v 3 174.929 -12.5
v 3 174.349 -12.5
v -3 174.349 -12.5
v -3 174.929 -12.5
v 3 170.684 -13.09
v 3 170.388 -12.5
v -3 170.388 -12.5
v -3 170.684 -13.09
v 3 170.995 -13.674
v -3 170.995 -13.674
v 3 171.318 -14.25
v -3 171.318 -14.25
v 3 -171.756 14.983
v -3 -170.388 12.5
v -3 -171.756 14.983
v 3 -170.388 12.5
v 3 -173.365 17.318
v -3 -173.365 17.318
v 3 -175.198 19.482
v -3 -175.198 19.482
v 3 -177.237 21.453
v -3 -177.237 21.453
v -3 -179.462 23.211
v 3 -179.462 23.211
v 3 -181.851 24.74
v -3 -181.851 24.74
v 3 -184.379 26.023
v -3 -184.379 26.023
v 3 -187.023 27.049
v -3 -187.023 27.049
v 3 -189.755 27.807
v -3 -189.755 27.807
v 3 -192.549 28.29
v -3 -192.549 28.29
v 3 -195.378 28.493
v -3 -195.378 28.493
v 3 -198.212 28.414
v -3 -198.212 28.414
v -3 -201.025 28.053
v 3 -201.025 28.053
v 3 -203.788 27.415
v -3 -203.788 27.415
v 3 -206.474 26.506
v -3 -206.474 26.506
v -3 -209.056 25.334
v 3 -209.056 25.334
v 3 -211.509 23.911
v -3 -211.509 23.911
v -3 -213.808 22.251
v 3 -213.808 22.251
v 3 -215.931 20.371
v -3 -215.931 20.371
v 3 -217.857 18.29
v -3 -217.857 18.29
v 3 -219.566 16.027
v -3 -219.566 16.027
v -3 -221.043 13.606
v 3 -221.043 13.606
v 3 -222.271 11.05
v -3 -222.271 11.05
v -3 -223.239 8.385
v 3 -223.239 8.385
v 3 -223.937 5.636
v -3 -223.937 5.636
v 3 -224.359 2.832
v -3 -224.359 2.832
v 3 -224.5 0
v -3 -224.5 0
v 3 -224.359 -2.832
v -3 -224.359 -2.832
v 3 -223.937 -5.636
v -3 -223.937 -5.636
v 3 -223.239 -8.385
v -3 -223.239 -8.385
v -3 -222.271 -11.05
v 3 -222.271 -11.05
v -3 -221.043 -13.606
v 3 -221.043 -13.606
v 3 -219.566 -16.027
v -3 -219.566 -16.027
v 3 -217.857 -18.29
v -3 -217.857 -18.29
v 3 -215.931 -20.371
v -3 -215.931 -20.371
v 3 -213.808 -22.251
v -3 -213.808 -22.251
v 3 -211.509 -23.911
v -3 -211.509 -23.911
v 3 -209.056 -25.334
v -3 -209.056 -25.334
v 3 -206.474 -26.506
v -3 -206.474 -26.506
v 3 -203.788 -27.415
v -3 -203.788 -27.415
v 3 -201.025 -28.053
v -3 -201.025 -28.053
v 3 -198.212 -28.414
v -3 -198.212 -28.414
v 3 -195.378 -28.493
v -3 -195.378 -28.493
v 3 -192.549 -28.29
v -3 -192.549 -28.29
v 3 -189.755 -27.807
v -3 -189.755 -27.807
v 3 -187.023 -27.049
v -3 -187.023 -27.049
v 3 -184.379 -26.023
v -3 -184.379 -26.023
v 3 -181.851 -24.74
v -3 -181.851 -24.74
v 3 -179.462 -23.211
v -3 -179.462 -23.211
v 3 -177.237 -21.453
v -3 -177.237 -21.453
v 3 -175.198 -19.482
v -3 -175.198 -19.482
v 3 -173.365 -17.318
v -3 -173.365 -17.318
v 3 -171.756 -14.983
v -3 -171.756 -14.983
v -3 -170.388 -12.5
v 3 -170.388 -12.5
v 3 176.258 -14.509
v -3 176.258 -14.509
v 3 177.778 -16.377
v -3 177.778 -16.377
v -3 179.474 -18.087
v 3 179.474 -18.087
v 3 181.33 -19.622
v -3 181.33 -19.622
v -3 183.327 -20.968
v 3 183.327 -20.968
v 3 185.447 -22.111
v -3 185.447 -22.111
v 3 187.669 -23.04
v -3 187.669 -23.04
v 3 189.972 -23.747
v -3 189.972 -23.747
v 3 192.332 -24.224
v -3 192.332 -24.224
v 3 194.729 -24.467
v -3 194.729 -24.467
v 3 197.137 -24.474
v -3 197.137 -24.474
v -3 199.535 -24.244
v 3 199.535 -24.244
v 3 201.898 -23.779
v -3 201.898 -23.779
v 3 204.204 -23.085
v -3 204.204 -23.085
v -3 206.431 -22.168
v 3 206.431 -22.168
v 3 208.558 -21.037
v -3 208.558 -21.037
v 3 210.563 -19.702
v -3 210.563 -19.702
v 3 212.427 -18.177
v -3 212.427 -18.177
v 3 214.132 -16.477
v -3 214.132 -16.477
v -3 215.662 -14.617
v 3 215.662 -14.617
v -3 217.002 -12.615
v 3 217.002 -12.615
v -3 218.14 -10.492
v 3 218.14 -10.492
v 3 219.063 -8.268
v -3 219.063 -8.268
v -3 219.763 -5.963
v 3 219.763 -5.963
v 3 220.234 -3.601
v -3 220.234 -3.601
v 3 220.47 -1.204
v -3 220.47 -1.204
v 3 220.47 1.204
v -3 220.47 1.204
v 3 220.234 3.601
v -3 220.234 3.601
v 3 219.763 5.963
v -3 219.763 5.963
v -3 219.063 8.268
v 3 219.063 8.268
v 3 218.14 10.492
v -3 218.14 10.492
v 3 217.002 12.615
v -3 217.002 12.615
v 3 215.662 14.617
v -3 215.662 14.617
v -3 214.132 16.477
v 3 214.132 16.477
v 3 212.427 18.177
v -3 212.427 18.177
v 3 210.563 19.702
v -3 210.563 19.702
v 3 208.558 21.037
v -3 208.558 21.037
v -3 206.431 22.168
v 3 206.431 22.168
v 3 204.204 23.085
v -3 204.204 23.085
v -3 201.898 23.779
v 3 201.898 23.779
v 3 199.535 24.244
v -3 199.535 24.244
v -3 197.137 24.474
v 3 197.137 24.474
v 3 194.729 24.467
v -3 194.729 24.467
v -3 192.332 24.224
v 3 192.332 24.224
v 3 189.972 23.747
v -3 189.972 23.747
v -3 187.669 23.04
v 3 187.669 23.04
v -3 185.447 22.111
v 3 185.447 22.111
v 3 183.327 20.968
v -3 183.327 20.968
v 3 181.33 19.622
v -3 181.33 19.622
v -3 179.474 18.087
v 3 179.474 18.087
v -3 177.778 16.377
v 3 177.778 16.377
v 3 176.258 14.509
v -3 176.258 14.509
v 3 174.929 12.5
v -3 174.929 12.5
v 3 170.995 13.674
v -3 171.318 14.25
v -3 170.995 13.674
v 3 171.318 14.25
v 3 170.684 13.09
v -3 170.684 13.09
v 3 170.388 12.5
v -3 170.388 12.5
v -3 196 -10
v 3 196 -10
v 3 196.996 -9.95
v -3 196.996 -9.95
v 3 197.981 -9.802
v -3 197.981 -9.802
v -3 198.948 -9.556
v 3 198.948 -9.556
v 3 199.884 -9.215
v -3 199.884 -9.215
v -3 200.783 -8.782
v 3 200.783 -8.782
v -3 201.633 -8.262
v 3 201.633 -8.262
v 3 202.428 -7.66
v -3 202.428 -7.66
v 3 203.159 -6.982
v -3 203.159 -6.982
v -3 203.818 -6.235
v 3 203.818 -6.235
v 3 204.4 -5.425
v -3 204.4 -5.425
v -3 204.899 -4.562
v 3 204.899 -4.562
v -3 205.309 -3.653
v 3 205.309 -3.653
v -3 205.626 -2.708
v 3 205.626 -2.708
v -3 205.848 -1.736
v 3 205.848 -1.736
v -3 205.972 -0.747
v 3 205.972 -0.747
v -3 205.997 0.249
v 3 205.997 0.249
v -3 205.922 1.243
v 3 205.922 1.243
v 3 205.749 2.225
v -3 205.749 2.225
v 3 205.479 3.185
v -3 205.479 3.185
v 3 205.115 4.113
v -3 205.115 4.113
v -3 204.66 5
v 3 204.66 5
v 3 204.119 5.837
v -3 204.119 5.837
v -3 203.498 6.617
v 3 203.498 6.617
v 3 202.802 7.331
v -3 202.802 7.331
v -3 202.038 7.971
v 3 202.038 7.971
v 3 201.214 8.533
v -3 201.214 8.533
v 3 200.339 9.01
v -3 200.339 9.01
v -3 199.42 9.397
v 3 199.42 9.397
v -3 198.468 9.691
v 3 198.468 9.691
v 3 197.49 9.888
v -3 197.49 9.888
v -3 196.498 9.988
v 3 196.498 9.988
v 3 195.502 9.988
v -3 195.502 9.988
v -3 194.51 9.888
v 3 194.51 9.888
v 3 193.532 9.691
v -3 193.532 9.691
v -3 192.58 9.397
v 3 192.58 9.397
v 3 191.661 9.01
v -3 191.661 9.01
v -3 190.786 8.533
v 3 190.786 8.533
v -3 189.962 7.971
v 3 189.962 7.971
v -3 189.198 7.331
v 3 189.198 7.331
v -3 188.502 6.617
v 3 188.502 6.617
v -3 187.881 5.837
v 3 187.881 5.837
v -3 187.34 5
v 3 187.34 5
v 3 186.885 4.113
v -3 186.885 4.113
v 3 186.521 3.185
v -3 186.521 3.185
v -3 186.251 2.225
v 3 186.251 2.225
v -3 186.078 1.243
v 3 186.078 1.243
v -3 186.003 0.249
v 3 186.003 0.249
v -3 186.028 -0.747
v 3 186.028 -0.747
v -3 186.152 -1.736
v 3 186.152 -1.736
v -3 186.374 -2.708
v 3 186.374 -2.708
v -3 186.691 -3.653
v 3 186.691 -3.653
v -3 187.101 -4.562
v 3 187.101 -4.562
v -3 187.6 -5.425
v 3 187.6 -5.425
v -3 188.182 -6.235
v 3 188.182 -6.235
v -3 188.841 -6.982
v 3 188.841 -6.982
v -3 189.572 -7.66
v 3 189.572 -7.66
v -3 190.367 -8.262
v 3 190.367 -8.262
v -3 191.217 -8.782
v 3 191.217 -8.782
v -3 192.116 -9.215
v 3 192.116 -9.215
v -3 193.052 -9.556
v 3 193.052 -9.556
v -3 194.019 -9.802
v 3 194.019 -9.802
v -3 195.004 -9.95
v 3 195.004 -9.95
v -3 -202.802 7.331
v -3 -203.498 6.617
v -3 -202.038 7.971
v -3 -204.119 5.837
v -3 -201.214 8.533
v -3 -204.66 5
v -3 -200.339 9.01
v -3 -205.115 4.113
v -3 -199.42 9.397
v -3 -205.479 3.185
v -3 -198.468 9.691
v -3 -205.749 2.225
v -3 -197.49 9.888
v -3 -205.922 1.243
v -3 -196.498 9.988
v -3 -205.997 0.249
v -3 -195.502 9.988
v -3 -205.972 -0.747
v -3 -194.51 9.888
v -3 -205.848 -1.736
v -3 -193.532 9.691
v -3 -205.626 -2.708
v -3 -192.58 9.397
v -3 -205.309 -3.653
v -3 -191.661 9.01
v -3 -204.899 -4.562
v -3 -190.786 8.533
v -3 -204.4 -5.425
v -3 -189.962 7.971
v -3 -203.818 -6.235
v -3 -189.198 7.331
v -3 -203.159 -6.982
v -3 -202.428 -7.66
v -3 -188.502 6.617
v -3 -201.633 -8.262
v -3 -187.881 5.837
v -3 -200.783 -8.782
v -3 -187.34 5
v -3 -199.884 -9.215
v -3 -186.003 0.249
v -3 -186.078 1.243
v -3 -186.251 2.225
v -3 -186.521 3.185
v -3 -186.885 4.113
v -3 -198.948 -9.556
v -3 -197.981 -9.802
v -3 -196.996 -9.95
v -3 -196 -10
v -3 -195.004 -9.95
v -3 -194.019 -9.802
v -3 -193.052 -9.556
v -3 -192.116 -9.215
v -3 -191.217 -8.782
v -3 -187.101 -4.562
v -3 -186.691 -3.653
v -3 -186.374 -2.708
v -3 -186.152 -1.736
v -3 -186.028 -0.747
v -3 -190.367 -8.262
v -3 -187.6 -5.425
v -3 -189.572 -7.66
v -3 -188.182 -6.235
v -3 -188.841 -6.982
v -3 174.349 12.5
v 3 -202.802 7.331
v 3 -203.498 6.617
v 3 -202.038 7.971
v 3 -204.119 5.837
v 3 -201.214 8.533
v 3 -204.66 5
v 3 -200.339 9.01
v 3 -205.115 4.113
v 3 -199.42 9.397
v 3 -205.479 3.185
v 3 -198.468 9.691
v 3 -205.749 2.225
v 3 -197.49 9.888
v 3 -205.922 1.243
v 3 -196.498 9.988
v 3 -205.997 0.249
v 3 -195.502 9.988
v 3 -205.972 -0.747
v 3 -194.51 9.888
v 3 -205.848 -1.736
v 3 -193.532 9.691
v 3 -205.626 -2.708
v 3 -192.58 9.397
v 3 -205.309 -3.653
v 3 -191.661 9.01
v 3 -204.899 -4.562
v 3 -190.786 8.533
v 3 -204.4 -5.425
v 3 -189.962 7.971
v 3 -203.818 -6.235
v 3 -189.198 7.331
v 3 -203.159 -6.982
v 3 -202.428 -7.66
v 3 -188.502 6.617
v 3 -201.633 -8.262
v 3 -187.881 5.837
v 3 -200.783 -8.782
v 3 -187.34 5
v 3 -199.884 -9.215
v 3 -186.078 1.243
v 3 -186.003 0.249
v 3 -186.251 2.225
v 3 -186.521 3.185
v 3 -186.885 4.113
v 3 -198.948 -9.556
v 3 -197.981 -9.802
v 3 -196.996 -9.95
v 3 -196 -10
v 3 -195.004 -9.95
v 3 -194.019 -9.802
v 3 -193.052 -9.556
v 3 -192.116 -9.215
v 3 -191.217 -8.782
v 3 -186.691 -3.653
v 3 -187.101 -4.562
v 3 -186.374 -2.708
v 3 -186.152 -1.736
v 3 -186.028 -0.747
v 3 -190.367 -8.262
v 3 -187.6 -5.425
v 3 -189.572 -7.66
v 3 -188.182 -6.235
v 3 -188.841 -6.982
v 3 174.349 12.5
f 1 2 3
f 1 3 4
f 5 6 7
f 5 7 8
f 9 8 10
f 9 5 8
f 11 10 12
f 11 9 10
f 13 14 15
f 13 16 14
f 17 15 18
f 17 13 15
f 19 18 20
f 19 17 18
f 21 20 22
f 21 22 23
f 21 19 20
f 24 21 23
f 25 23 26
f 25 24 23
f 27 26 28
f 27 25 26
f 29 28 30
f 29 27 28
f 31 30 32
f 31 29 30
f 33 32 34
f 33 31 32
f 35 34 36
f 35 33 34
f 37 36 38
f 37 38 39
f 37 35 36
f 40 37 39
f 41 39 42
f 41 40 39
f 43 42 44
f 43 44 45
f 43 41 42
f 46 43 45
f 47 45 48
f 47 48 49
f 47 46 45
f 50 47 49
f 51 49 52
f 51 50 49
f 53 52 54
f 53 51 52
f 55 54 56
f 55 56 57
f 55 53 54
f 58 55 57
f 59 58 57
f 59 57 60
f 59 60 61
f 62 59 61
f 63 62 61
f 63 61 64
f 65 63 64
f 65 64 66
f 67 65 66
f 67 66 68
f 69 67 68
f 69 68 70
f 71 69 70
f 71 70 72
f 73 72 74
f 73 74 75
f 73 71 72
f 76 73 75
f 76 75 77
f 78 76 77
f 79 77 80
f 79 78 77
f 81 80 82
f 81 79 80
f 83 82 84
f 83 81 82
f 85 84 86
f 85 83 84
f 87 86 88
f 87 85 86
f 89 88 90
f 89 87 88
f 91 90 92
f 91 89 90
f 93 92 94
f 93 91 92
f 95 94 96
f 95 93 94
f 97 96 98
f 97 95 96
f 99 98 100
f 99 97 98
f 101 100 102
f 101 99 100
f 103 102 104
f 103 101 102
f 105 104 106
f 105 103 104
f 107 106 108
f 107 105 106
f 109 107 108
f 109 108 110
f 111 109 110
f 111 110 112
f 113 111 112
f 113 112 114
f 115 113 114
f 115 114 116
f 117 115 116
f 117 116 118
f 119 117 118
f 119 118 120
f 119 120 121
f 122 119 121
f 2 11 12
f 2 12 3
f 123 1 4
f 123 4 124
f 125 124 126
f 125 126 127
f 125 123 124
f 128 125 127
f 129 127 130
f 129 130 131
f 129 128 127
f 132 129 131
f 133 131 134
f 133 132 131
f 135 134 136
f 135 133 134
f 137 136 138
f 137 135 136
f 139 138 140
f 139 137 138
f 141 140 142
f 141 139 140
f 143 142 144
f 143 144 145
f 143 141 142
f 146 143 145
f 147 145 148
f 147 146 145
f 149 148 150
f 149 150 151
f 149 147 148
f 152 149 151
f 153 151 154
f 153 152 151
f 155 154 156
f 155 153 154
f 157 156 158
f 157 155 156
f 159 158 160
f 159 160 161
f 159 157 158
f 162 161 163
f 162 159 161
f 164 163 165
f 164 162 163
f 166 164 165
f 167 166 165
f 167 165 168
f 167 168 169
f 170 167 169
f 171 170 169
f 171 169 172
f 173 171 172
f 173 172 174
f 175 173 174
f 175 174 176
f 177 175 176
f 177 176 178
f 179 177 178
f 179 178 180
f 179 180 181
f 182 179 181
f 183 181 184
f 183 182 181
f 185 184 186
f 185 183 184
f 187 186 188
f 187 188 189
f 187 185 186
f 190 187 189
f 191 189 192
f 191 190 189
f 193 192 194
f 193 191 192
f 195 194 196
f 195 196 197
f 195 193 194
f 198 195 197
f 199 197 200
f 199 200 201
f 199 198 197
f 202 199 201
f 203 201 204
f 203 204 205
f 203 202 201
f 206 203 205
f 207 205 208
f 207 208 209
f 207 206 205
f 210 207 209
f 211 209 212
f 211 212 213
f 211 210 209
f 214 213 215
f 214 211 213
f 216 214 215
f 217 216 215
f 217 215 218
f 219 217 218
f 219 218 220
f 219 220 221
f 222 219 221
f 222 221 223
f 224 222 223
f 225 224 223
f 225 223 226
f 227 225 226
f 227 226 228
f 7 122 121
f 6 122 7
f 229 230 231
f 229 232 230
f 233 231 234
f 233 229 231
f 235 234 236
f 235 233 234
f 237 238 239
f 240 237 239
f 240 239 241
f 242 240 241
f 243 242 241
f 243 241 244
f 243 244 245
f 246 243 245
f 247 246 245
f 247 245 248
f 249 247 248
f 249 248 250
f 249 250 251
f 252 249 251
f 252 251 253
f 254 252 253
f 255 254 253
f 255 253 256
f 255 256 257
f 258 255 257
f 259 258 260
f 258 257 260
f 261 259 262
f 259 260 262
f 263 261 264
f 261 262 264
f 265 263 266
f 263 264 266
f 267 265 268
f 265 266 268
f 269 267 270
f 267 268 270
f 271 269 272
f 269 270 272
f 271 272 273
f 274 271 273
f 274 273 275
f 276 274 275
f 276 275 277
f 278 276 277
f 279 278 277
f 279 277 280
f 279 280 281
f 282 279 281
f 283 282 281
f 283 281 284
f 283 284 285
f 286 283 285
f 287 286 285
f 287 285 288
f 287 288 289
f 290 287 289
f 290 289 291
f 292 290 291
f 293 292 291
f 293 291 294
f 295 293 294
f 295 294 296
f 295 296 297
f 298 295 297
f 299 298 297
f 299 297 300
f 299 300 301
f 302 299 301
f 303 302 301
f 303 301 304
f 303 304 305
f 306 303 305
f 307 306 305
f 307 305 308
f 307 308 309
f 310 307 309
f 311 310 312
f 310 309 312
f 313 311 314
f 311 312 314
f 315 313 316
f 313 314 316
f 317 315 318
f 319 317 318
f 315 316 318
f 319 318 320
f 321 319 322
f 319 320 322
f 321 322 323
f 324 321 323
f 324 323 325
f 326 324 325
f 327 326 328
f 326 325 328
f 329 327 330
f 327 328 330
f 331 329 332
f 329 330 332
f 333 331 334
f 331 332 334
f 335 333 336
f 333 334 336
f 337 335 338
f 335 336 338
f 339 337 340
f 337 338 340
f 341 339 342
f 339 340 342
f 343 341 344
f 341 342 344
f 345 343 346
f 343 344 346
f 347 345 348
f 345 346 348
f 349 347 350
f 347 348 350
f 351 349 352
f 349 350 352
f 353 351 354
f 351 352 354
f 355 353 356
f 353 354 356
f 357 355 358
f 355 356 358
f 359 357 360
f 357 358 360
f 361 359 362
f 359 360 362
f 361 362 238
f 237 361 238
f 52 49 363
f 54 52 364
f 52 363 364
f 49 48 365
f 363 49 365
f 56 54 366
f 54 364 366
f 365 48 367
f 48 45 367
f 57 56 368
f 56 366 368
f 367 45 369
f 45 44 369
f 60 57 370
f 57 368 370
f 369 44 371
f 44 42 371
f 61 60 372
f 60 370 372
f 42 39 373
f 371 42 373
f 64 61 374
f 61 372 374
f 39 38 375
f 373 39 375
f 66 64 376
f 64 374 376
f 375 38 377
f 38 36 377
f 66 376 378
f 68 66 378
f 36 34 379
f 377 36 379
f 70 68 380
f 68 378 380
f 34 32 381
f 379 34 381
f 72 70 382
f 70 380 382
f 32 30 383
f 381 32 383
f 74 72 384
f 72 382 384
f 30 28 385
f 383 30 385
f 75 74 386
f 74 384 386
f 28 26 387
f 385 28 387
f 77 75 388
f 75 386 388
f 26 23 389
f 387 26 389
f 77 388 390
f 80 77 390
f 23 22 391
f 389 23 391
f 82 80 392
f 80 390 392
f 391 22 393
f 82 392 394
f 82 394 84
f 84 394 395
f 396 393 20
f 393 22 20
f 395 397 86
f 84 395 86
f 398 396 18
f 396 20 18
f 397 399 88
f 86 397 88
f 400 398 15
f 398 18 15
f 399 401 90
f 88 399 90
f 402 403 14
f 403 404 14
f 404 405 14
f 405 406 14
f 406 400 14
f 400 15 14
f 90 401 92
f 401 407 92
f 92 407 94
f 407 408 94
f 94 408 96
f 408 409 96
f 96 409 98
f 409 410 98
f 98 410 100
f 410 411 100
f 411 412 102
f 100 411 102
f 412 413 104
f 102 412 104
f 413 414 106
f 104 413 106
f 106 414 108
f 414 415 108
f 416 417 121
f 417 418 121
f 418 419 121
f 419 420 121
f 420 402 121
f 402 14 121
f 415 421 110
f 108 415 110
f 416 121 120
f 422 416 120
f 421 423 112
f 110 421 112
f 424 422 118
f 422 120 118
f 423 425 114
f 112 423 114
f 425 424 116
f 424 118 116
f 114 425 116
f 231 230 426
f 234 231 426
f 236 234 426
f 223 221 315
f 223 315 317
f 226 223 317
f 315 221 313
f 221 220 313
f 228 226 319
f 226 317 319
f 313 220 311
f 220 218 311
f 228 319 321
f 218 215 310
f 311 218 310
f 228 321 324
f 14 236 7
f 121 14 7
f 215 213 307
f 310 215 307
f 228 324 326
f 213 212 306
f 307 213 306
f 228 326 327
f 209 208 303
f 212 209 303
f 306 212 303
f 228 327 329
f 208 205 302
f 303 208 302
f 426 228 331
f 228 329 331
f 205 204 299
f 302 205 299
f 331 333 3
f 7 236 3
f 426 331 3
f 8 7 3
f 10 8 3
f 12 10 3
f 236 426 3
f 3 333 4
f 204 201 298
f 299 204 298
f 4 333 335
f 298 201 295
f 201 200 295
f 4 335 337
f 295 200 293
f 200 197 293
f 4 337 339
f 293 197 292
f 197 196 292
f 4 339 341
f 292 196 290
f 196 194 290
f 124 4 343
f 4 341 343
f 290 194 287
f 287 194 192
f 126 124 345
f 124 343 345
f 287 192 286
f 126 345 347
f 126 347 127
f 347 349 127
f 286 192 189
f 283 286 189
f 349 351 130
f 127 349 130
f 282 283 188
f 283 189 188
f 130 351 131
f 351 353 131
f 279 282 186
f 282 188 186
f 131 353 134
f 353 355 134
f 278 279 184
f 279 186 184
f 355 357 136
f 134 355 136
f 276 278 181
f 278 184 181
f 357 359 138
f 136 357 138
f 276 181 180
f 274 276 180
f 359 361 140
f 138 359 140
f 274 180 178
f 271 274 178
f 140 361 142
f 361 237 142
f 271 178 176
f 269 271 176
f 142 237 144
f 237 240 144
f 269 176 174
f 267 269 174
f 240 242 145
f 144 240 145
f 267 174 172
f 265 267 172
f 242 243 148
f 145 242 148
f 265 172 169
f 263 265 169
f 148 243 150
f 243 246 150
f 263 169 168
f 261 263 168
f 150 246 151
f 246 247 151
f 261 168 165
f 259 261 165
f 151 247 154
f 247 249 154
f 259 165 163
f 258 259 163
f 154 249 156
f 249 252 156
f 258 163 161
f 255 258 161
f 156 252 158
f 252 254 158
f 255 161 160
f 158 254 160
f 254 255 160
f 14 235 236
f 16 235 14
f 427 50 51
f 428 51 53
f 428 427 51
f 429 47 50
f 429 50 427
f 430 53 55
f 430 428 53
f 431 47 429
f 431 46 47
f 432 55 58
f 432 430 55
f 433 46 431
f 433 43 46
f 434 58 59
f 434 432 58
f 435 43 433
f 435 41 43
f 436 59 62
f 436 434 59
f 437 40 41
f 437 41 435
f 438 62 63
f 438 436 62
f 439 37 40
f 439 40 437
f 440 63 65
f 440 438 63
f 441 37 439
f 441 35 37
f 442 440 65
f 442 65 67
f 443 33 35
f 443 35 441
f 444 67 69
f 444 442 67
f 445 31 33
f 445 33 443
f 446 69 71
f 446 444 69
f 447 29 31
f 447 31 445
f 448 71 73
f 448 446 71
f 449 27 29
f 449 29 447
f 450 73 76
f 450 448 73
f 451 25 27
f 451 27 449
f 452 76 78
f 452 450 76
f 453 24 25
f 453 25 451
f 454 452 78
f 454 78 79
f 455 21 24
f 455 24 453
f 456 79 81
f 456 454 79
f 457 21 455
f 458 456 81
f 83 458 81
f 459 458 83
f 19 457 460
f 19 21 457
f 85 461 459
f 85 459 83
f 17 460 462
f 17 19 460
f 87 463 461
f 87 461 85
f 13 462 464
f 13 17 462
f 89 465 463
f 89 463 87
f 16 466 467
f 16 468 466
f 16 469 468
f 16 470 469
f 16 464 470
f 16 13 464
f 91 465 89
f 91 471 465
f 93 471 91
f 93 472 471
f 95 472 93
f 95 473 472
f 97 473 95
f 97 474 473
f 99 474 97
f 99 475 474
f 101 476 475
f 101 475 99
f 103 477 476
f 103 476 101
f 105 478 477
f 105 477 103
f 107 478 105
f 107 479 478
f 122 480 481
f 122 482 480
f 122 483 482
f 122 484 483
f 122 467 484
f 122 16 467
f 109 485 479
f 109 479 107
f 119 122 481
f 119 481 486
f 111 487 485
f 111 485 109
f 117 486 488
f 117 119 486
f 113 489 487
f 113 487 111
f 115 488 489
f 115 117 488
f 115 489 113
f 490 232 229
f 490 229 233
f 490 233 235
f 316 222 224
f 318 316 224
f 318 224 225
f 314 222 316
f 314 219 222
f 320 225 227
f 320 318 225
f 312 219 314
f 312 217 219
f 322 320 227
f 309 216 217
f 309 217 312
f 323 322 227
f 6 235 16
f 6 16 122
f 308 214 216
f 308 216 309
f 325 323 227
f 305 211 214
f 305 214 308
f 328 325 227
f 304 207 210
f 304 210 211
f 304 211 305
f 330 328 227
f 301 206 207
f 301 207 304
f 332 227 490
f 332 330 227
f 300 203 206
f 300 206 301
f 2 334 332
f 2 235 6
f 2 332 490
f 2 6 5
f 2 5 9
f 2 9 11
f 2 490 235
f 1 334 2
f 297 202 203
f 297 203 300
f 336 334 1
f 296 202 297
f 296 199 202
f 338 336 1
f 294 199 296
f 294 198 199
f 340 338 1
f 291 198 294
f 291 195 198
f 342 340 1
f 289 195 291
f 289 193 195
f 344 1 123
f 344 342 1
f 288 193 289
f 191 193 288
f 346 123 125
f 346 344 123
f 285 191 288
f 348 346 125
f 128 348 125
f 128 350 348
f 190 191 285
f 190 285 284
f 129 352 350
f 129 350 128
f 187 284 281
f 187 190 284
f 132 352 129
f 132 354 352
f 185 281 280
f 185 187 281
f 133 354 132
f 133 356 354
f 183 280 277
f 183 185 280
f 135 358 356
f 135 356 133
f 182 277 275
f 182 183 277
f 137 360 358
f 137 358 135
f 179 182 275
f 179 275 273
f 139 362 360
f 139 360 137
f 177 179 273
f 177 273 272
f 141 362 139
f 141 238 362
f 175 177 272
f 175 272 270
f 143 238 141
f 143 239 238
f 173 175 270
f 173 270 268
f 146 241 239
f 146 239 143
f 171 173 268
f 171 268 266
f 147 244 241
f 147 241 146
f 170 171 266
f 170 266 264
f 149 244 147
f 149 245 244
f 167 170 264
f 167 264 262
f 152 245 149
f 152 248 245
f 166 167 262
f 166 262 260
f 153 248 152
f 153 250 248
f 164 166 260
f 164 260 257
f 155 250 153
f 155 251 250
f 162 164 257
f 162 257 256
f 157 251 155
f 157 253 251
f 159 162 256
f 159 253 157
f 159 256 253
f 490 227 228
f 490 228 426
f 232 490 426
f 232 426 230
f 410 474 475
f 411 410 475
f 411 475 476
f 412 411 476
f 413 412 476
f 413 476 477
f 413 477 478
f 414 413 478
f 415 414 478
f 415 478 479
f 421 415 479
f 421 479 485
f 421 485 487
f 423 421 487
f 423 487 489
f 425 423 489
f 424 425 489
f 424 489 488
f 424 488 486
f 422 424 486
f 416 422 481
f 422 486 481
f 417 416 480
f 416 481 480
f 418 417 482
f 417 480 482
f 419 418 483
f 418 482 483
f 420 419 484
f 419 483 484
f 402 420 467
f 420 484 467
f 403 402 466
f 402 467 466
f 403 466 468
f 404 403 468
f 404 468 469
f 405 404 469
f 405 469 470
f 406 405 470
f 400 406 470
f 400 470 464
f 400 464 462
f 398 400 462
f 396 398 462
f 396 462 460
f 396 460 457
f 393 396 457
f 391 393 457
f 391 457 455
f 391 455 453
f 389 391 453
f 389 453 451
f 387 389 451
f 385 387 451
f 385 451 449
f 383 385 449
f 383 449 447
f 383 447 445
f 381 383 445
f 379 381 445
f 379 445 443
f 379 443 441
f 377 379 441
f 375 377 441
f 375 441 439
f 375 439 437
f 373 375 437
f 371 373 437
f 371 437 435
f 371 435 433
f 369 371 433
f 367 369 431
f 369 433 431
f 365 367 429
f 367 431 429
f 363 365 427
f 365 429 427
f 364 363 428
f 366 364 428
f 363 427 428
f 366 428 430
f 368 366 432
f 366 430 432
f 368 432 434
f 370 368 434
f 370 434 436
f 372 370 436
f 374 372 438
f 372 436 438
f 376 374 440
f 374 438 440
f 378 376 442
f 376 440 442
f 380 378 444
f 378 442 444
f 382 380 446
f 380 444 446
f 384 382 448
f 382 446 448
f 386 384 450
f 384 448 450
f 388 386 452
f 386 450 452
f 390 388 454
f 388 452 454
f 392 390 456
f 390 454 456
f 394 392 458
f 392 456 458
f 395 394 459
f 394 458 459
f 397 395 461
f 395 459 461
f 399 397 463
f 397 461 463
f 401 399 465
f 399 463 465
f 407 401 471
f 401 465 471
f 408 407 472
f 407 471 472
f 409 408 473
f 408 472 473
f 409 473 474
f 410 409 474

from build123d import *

# Parameters (mm, degrees)
BOSS_EXTRUDE1_DEPTH = 3
SKETCH2_R           = 10
CUT_EXTRUDE1_DEPTH  = 7


with BuildPart() as part:
    # Sketch1 → Boss-Extrude1 (new body, symmetric)
    with BuildSketch(Plane(origin=(0, 0, 0), x_dir=(0, 0, -1), z_dir=(1, 0, 0))):
        with BuildLine():
            ThreePointArc((-12.5, -170.38750305), (0, -224.5), (12.5, -170.38750305))
            Line((12.5, -170.38750305), (12.5, 170.38750305))
            ThreePointArc((12.5, 170.38750305), (13.38309417, 170.837671204), (14.25, 171.318275992))
            Line((14.25, 171.318275992), (12.5, 174.349364905))
            Line((12.5, 174.349364905), (12.5, 174.928692494))
            ThreePointArc((12.5, 174.928692494), (0, 220.5), (-12.5, 174.928692494))
            Line((-12.5, 174.928692494), (-12.5, 174.349364905))
            Line((-12.5, 174.349364905), (-14.25, 171.318275992))
            ThreePointArc((-14.25, 171.318275992), (-13.38309417, 170.837671204), (-12.5, 170.38750305))
            Line((-12.5, 170.38750305), (-12.5, -170.38750305))
        make_face()
    extrude(amount=BOSS_EXTRUDE1_DEPTH, both=True)

    # Sketch2 → Cut-Extrude1 (cut, through all)
    with BuildSketch(Plane(origin=(3, 0, 0), x_dir=(0, 0, -1), z_dir=(1, 0, 0))):
        with Locations((0, -196)):
            Circle(SKETCH2_R)
        with Locations((0, 196)):
            Circle(SKETCH2_R)
    extrude(amount=-CUT_EXTRUDE1_DEPTH, mode=Mode.SUBTRACT)


solid = part.part
